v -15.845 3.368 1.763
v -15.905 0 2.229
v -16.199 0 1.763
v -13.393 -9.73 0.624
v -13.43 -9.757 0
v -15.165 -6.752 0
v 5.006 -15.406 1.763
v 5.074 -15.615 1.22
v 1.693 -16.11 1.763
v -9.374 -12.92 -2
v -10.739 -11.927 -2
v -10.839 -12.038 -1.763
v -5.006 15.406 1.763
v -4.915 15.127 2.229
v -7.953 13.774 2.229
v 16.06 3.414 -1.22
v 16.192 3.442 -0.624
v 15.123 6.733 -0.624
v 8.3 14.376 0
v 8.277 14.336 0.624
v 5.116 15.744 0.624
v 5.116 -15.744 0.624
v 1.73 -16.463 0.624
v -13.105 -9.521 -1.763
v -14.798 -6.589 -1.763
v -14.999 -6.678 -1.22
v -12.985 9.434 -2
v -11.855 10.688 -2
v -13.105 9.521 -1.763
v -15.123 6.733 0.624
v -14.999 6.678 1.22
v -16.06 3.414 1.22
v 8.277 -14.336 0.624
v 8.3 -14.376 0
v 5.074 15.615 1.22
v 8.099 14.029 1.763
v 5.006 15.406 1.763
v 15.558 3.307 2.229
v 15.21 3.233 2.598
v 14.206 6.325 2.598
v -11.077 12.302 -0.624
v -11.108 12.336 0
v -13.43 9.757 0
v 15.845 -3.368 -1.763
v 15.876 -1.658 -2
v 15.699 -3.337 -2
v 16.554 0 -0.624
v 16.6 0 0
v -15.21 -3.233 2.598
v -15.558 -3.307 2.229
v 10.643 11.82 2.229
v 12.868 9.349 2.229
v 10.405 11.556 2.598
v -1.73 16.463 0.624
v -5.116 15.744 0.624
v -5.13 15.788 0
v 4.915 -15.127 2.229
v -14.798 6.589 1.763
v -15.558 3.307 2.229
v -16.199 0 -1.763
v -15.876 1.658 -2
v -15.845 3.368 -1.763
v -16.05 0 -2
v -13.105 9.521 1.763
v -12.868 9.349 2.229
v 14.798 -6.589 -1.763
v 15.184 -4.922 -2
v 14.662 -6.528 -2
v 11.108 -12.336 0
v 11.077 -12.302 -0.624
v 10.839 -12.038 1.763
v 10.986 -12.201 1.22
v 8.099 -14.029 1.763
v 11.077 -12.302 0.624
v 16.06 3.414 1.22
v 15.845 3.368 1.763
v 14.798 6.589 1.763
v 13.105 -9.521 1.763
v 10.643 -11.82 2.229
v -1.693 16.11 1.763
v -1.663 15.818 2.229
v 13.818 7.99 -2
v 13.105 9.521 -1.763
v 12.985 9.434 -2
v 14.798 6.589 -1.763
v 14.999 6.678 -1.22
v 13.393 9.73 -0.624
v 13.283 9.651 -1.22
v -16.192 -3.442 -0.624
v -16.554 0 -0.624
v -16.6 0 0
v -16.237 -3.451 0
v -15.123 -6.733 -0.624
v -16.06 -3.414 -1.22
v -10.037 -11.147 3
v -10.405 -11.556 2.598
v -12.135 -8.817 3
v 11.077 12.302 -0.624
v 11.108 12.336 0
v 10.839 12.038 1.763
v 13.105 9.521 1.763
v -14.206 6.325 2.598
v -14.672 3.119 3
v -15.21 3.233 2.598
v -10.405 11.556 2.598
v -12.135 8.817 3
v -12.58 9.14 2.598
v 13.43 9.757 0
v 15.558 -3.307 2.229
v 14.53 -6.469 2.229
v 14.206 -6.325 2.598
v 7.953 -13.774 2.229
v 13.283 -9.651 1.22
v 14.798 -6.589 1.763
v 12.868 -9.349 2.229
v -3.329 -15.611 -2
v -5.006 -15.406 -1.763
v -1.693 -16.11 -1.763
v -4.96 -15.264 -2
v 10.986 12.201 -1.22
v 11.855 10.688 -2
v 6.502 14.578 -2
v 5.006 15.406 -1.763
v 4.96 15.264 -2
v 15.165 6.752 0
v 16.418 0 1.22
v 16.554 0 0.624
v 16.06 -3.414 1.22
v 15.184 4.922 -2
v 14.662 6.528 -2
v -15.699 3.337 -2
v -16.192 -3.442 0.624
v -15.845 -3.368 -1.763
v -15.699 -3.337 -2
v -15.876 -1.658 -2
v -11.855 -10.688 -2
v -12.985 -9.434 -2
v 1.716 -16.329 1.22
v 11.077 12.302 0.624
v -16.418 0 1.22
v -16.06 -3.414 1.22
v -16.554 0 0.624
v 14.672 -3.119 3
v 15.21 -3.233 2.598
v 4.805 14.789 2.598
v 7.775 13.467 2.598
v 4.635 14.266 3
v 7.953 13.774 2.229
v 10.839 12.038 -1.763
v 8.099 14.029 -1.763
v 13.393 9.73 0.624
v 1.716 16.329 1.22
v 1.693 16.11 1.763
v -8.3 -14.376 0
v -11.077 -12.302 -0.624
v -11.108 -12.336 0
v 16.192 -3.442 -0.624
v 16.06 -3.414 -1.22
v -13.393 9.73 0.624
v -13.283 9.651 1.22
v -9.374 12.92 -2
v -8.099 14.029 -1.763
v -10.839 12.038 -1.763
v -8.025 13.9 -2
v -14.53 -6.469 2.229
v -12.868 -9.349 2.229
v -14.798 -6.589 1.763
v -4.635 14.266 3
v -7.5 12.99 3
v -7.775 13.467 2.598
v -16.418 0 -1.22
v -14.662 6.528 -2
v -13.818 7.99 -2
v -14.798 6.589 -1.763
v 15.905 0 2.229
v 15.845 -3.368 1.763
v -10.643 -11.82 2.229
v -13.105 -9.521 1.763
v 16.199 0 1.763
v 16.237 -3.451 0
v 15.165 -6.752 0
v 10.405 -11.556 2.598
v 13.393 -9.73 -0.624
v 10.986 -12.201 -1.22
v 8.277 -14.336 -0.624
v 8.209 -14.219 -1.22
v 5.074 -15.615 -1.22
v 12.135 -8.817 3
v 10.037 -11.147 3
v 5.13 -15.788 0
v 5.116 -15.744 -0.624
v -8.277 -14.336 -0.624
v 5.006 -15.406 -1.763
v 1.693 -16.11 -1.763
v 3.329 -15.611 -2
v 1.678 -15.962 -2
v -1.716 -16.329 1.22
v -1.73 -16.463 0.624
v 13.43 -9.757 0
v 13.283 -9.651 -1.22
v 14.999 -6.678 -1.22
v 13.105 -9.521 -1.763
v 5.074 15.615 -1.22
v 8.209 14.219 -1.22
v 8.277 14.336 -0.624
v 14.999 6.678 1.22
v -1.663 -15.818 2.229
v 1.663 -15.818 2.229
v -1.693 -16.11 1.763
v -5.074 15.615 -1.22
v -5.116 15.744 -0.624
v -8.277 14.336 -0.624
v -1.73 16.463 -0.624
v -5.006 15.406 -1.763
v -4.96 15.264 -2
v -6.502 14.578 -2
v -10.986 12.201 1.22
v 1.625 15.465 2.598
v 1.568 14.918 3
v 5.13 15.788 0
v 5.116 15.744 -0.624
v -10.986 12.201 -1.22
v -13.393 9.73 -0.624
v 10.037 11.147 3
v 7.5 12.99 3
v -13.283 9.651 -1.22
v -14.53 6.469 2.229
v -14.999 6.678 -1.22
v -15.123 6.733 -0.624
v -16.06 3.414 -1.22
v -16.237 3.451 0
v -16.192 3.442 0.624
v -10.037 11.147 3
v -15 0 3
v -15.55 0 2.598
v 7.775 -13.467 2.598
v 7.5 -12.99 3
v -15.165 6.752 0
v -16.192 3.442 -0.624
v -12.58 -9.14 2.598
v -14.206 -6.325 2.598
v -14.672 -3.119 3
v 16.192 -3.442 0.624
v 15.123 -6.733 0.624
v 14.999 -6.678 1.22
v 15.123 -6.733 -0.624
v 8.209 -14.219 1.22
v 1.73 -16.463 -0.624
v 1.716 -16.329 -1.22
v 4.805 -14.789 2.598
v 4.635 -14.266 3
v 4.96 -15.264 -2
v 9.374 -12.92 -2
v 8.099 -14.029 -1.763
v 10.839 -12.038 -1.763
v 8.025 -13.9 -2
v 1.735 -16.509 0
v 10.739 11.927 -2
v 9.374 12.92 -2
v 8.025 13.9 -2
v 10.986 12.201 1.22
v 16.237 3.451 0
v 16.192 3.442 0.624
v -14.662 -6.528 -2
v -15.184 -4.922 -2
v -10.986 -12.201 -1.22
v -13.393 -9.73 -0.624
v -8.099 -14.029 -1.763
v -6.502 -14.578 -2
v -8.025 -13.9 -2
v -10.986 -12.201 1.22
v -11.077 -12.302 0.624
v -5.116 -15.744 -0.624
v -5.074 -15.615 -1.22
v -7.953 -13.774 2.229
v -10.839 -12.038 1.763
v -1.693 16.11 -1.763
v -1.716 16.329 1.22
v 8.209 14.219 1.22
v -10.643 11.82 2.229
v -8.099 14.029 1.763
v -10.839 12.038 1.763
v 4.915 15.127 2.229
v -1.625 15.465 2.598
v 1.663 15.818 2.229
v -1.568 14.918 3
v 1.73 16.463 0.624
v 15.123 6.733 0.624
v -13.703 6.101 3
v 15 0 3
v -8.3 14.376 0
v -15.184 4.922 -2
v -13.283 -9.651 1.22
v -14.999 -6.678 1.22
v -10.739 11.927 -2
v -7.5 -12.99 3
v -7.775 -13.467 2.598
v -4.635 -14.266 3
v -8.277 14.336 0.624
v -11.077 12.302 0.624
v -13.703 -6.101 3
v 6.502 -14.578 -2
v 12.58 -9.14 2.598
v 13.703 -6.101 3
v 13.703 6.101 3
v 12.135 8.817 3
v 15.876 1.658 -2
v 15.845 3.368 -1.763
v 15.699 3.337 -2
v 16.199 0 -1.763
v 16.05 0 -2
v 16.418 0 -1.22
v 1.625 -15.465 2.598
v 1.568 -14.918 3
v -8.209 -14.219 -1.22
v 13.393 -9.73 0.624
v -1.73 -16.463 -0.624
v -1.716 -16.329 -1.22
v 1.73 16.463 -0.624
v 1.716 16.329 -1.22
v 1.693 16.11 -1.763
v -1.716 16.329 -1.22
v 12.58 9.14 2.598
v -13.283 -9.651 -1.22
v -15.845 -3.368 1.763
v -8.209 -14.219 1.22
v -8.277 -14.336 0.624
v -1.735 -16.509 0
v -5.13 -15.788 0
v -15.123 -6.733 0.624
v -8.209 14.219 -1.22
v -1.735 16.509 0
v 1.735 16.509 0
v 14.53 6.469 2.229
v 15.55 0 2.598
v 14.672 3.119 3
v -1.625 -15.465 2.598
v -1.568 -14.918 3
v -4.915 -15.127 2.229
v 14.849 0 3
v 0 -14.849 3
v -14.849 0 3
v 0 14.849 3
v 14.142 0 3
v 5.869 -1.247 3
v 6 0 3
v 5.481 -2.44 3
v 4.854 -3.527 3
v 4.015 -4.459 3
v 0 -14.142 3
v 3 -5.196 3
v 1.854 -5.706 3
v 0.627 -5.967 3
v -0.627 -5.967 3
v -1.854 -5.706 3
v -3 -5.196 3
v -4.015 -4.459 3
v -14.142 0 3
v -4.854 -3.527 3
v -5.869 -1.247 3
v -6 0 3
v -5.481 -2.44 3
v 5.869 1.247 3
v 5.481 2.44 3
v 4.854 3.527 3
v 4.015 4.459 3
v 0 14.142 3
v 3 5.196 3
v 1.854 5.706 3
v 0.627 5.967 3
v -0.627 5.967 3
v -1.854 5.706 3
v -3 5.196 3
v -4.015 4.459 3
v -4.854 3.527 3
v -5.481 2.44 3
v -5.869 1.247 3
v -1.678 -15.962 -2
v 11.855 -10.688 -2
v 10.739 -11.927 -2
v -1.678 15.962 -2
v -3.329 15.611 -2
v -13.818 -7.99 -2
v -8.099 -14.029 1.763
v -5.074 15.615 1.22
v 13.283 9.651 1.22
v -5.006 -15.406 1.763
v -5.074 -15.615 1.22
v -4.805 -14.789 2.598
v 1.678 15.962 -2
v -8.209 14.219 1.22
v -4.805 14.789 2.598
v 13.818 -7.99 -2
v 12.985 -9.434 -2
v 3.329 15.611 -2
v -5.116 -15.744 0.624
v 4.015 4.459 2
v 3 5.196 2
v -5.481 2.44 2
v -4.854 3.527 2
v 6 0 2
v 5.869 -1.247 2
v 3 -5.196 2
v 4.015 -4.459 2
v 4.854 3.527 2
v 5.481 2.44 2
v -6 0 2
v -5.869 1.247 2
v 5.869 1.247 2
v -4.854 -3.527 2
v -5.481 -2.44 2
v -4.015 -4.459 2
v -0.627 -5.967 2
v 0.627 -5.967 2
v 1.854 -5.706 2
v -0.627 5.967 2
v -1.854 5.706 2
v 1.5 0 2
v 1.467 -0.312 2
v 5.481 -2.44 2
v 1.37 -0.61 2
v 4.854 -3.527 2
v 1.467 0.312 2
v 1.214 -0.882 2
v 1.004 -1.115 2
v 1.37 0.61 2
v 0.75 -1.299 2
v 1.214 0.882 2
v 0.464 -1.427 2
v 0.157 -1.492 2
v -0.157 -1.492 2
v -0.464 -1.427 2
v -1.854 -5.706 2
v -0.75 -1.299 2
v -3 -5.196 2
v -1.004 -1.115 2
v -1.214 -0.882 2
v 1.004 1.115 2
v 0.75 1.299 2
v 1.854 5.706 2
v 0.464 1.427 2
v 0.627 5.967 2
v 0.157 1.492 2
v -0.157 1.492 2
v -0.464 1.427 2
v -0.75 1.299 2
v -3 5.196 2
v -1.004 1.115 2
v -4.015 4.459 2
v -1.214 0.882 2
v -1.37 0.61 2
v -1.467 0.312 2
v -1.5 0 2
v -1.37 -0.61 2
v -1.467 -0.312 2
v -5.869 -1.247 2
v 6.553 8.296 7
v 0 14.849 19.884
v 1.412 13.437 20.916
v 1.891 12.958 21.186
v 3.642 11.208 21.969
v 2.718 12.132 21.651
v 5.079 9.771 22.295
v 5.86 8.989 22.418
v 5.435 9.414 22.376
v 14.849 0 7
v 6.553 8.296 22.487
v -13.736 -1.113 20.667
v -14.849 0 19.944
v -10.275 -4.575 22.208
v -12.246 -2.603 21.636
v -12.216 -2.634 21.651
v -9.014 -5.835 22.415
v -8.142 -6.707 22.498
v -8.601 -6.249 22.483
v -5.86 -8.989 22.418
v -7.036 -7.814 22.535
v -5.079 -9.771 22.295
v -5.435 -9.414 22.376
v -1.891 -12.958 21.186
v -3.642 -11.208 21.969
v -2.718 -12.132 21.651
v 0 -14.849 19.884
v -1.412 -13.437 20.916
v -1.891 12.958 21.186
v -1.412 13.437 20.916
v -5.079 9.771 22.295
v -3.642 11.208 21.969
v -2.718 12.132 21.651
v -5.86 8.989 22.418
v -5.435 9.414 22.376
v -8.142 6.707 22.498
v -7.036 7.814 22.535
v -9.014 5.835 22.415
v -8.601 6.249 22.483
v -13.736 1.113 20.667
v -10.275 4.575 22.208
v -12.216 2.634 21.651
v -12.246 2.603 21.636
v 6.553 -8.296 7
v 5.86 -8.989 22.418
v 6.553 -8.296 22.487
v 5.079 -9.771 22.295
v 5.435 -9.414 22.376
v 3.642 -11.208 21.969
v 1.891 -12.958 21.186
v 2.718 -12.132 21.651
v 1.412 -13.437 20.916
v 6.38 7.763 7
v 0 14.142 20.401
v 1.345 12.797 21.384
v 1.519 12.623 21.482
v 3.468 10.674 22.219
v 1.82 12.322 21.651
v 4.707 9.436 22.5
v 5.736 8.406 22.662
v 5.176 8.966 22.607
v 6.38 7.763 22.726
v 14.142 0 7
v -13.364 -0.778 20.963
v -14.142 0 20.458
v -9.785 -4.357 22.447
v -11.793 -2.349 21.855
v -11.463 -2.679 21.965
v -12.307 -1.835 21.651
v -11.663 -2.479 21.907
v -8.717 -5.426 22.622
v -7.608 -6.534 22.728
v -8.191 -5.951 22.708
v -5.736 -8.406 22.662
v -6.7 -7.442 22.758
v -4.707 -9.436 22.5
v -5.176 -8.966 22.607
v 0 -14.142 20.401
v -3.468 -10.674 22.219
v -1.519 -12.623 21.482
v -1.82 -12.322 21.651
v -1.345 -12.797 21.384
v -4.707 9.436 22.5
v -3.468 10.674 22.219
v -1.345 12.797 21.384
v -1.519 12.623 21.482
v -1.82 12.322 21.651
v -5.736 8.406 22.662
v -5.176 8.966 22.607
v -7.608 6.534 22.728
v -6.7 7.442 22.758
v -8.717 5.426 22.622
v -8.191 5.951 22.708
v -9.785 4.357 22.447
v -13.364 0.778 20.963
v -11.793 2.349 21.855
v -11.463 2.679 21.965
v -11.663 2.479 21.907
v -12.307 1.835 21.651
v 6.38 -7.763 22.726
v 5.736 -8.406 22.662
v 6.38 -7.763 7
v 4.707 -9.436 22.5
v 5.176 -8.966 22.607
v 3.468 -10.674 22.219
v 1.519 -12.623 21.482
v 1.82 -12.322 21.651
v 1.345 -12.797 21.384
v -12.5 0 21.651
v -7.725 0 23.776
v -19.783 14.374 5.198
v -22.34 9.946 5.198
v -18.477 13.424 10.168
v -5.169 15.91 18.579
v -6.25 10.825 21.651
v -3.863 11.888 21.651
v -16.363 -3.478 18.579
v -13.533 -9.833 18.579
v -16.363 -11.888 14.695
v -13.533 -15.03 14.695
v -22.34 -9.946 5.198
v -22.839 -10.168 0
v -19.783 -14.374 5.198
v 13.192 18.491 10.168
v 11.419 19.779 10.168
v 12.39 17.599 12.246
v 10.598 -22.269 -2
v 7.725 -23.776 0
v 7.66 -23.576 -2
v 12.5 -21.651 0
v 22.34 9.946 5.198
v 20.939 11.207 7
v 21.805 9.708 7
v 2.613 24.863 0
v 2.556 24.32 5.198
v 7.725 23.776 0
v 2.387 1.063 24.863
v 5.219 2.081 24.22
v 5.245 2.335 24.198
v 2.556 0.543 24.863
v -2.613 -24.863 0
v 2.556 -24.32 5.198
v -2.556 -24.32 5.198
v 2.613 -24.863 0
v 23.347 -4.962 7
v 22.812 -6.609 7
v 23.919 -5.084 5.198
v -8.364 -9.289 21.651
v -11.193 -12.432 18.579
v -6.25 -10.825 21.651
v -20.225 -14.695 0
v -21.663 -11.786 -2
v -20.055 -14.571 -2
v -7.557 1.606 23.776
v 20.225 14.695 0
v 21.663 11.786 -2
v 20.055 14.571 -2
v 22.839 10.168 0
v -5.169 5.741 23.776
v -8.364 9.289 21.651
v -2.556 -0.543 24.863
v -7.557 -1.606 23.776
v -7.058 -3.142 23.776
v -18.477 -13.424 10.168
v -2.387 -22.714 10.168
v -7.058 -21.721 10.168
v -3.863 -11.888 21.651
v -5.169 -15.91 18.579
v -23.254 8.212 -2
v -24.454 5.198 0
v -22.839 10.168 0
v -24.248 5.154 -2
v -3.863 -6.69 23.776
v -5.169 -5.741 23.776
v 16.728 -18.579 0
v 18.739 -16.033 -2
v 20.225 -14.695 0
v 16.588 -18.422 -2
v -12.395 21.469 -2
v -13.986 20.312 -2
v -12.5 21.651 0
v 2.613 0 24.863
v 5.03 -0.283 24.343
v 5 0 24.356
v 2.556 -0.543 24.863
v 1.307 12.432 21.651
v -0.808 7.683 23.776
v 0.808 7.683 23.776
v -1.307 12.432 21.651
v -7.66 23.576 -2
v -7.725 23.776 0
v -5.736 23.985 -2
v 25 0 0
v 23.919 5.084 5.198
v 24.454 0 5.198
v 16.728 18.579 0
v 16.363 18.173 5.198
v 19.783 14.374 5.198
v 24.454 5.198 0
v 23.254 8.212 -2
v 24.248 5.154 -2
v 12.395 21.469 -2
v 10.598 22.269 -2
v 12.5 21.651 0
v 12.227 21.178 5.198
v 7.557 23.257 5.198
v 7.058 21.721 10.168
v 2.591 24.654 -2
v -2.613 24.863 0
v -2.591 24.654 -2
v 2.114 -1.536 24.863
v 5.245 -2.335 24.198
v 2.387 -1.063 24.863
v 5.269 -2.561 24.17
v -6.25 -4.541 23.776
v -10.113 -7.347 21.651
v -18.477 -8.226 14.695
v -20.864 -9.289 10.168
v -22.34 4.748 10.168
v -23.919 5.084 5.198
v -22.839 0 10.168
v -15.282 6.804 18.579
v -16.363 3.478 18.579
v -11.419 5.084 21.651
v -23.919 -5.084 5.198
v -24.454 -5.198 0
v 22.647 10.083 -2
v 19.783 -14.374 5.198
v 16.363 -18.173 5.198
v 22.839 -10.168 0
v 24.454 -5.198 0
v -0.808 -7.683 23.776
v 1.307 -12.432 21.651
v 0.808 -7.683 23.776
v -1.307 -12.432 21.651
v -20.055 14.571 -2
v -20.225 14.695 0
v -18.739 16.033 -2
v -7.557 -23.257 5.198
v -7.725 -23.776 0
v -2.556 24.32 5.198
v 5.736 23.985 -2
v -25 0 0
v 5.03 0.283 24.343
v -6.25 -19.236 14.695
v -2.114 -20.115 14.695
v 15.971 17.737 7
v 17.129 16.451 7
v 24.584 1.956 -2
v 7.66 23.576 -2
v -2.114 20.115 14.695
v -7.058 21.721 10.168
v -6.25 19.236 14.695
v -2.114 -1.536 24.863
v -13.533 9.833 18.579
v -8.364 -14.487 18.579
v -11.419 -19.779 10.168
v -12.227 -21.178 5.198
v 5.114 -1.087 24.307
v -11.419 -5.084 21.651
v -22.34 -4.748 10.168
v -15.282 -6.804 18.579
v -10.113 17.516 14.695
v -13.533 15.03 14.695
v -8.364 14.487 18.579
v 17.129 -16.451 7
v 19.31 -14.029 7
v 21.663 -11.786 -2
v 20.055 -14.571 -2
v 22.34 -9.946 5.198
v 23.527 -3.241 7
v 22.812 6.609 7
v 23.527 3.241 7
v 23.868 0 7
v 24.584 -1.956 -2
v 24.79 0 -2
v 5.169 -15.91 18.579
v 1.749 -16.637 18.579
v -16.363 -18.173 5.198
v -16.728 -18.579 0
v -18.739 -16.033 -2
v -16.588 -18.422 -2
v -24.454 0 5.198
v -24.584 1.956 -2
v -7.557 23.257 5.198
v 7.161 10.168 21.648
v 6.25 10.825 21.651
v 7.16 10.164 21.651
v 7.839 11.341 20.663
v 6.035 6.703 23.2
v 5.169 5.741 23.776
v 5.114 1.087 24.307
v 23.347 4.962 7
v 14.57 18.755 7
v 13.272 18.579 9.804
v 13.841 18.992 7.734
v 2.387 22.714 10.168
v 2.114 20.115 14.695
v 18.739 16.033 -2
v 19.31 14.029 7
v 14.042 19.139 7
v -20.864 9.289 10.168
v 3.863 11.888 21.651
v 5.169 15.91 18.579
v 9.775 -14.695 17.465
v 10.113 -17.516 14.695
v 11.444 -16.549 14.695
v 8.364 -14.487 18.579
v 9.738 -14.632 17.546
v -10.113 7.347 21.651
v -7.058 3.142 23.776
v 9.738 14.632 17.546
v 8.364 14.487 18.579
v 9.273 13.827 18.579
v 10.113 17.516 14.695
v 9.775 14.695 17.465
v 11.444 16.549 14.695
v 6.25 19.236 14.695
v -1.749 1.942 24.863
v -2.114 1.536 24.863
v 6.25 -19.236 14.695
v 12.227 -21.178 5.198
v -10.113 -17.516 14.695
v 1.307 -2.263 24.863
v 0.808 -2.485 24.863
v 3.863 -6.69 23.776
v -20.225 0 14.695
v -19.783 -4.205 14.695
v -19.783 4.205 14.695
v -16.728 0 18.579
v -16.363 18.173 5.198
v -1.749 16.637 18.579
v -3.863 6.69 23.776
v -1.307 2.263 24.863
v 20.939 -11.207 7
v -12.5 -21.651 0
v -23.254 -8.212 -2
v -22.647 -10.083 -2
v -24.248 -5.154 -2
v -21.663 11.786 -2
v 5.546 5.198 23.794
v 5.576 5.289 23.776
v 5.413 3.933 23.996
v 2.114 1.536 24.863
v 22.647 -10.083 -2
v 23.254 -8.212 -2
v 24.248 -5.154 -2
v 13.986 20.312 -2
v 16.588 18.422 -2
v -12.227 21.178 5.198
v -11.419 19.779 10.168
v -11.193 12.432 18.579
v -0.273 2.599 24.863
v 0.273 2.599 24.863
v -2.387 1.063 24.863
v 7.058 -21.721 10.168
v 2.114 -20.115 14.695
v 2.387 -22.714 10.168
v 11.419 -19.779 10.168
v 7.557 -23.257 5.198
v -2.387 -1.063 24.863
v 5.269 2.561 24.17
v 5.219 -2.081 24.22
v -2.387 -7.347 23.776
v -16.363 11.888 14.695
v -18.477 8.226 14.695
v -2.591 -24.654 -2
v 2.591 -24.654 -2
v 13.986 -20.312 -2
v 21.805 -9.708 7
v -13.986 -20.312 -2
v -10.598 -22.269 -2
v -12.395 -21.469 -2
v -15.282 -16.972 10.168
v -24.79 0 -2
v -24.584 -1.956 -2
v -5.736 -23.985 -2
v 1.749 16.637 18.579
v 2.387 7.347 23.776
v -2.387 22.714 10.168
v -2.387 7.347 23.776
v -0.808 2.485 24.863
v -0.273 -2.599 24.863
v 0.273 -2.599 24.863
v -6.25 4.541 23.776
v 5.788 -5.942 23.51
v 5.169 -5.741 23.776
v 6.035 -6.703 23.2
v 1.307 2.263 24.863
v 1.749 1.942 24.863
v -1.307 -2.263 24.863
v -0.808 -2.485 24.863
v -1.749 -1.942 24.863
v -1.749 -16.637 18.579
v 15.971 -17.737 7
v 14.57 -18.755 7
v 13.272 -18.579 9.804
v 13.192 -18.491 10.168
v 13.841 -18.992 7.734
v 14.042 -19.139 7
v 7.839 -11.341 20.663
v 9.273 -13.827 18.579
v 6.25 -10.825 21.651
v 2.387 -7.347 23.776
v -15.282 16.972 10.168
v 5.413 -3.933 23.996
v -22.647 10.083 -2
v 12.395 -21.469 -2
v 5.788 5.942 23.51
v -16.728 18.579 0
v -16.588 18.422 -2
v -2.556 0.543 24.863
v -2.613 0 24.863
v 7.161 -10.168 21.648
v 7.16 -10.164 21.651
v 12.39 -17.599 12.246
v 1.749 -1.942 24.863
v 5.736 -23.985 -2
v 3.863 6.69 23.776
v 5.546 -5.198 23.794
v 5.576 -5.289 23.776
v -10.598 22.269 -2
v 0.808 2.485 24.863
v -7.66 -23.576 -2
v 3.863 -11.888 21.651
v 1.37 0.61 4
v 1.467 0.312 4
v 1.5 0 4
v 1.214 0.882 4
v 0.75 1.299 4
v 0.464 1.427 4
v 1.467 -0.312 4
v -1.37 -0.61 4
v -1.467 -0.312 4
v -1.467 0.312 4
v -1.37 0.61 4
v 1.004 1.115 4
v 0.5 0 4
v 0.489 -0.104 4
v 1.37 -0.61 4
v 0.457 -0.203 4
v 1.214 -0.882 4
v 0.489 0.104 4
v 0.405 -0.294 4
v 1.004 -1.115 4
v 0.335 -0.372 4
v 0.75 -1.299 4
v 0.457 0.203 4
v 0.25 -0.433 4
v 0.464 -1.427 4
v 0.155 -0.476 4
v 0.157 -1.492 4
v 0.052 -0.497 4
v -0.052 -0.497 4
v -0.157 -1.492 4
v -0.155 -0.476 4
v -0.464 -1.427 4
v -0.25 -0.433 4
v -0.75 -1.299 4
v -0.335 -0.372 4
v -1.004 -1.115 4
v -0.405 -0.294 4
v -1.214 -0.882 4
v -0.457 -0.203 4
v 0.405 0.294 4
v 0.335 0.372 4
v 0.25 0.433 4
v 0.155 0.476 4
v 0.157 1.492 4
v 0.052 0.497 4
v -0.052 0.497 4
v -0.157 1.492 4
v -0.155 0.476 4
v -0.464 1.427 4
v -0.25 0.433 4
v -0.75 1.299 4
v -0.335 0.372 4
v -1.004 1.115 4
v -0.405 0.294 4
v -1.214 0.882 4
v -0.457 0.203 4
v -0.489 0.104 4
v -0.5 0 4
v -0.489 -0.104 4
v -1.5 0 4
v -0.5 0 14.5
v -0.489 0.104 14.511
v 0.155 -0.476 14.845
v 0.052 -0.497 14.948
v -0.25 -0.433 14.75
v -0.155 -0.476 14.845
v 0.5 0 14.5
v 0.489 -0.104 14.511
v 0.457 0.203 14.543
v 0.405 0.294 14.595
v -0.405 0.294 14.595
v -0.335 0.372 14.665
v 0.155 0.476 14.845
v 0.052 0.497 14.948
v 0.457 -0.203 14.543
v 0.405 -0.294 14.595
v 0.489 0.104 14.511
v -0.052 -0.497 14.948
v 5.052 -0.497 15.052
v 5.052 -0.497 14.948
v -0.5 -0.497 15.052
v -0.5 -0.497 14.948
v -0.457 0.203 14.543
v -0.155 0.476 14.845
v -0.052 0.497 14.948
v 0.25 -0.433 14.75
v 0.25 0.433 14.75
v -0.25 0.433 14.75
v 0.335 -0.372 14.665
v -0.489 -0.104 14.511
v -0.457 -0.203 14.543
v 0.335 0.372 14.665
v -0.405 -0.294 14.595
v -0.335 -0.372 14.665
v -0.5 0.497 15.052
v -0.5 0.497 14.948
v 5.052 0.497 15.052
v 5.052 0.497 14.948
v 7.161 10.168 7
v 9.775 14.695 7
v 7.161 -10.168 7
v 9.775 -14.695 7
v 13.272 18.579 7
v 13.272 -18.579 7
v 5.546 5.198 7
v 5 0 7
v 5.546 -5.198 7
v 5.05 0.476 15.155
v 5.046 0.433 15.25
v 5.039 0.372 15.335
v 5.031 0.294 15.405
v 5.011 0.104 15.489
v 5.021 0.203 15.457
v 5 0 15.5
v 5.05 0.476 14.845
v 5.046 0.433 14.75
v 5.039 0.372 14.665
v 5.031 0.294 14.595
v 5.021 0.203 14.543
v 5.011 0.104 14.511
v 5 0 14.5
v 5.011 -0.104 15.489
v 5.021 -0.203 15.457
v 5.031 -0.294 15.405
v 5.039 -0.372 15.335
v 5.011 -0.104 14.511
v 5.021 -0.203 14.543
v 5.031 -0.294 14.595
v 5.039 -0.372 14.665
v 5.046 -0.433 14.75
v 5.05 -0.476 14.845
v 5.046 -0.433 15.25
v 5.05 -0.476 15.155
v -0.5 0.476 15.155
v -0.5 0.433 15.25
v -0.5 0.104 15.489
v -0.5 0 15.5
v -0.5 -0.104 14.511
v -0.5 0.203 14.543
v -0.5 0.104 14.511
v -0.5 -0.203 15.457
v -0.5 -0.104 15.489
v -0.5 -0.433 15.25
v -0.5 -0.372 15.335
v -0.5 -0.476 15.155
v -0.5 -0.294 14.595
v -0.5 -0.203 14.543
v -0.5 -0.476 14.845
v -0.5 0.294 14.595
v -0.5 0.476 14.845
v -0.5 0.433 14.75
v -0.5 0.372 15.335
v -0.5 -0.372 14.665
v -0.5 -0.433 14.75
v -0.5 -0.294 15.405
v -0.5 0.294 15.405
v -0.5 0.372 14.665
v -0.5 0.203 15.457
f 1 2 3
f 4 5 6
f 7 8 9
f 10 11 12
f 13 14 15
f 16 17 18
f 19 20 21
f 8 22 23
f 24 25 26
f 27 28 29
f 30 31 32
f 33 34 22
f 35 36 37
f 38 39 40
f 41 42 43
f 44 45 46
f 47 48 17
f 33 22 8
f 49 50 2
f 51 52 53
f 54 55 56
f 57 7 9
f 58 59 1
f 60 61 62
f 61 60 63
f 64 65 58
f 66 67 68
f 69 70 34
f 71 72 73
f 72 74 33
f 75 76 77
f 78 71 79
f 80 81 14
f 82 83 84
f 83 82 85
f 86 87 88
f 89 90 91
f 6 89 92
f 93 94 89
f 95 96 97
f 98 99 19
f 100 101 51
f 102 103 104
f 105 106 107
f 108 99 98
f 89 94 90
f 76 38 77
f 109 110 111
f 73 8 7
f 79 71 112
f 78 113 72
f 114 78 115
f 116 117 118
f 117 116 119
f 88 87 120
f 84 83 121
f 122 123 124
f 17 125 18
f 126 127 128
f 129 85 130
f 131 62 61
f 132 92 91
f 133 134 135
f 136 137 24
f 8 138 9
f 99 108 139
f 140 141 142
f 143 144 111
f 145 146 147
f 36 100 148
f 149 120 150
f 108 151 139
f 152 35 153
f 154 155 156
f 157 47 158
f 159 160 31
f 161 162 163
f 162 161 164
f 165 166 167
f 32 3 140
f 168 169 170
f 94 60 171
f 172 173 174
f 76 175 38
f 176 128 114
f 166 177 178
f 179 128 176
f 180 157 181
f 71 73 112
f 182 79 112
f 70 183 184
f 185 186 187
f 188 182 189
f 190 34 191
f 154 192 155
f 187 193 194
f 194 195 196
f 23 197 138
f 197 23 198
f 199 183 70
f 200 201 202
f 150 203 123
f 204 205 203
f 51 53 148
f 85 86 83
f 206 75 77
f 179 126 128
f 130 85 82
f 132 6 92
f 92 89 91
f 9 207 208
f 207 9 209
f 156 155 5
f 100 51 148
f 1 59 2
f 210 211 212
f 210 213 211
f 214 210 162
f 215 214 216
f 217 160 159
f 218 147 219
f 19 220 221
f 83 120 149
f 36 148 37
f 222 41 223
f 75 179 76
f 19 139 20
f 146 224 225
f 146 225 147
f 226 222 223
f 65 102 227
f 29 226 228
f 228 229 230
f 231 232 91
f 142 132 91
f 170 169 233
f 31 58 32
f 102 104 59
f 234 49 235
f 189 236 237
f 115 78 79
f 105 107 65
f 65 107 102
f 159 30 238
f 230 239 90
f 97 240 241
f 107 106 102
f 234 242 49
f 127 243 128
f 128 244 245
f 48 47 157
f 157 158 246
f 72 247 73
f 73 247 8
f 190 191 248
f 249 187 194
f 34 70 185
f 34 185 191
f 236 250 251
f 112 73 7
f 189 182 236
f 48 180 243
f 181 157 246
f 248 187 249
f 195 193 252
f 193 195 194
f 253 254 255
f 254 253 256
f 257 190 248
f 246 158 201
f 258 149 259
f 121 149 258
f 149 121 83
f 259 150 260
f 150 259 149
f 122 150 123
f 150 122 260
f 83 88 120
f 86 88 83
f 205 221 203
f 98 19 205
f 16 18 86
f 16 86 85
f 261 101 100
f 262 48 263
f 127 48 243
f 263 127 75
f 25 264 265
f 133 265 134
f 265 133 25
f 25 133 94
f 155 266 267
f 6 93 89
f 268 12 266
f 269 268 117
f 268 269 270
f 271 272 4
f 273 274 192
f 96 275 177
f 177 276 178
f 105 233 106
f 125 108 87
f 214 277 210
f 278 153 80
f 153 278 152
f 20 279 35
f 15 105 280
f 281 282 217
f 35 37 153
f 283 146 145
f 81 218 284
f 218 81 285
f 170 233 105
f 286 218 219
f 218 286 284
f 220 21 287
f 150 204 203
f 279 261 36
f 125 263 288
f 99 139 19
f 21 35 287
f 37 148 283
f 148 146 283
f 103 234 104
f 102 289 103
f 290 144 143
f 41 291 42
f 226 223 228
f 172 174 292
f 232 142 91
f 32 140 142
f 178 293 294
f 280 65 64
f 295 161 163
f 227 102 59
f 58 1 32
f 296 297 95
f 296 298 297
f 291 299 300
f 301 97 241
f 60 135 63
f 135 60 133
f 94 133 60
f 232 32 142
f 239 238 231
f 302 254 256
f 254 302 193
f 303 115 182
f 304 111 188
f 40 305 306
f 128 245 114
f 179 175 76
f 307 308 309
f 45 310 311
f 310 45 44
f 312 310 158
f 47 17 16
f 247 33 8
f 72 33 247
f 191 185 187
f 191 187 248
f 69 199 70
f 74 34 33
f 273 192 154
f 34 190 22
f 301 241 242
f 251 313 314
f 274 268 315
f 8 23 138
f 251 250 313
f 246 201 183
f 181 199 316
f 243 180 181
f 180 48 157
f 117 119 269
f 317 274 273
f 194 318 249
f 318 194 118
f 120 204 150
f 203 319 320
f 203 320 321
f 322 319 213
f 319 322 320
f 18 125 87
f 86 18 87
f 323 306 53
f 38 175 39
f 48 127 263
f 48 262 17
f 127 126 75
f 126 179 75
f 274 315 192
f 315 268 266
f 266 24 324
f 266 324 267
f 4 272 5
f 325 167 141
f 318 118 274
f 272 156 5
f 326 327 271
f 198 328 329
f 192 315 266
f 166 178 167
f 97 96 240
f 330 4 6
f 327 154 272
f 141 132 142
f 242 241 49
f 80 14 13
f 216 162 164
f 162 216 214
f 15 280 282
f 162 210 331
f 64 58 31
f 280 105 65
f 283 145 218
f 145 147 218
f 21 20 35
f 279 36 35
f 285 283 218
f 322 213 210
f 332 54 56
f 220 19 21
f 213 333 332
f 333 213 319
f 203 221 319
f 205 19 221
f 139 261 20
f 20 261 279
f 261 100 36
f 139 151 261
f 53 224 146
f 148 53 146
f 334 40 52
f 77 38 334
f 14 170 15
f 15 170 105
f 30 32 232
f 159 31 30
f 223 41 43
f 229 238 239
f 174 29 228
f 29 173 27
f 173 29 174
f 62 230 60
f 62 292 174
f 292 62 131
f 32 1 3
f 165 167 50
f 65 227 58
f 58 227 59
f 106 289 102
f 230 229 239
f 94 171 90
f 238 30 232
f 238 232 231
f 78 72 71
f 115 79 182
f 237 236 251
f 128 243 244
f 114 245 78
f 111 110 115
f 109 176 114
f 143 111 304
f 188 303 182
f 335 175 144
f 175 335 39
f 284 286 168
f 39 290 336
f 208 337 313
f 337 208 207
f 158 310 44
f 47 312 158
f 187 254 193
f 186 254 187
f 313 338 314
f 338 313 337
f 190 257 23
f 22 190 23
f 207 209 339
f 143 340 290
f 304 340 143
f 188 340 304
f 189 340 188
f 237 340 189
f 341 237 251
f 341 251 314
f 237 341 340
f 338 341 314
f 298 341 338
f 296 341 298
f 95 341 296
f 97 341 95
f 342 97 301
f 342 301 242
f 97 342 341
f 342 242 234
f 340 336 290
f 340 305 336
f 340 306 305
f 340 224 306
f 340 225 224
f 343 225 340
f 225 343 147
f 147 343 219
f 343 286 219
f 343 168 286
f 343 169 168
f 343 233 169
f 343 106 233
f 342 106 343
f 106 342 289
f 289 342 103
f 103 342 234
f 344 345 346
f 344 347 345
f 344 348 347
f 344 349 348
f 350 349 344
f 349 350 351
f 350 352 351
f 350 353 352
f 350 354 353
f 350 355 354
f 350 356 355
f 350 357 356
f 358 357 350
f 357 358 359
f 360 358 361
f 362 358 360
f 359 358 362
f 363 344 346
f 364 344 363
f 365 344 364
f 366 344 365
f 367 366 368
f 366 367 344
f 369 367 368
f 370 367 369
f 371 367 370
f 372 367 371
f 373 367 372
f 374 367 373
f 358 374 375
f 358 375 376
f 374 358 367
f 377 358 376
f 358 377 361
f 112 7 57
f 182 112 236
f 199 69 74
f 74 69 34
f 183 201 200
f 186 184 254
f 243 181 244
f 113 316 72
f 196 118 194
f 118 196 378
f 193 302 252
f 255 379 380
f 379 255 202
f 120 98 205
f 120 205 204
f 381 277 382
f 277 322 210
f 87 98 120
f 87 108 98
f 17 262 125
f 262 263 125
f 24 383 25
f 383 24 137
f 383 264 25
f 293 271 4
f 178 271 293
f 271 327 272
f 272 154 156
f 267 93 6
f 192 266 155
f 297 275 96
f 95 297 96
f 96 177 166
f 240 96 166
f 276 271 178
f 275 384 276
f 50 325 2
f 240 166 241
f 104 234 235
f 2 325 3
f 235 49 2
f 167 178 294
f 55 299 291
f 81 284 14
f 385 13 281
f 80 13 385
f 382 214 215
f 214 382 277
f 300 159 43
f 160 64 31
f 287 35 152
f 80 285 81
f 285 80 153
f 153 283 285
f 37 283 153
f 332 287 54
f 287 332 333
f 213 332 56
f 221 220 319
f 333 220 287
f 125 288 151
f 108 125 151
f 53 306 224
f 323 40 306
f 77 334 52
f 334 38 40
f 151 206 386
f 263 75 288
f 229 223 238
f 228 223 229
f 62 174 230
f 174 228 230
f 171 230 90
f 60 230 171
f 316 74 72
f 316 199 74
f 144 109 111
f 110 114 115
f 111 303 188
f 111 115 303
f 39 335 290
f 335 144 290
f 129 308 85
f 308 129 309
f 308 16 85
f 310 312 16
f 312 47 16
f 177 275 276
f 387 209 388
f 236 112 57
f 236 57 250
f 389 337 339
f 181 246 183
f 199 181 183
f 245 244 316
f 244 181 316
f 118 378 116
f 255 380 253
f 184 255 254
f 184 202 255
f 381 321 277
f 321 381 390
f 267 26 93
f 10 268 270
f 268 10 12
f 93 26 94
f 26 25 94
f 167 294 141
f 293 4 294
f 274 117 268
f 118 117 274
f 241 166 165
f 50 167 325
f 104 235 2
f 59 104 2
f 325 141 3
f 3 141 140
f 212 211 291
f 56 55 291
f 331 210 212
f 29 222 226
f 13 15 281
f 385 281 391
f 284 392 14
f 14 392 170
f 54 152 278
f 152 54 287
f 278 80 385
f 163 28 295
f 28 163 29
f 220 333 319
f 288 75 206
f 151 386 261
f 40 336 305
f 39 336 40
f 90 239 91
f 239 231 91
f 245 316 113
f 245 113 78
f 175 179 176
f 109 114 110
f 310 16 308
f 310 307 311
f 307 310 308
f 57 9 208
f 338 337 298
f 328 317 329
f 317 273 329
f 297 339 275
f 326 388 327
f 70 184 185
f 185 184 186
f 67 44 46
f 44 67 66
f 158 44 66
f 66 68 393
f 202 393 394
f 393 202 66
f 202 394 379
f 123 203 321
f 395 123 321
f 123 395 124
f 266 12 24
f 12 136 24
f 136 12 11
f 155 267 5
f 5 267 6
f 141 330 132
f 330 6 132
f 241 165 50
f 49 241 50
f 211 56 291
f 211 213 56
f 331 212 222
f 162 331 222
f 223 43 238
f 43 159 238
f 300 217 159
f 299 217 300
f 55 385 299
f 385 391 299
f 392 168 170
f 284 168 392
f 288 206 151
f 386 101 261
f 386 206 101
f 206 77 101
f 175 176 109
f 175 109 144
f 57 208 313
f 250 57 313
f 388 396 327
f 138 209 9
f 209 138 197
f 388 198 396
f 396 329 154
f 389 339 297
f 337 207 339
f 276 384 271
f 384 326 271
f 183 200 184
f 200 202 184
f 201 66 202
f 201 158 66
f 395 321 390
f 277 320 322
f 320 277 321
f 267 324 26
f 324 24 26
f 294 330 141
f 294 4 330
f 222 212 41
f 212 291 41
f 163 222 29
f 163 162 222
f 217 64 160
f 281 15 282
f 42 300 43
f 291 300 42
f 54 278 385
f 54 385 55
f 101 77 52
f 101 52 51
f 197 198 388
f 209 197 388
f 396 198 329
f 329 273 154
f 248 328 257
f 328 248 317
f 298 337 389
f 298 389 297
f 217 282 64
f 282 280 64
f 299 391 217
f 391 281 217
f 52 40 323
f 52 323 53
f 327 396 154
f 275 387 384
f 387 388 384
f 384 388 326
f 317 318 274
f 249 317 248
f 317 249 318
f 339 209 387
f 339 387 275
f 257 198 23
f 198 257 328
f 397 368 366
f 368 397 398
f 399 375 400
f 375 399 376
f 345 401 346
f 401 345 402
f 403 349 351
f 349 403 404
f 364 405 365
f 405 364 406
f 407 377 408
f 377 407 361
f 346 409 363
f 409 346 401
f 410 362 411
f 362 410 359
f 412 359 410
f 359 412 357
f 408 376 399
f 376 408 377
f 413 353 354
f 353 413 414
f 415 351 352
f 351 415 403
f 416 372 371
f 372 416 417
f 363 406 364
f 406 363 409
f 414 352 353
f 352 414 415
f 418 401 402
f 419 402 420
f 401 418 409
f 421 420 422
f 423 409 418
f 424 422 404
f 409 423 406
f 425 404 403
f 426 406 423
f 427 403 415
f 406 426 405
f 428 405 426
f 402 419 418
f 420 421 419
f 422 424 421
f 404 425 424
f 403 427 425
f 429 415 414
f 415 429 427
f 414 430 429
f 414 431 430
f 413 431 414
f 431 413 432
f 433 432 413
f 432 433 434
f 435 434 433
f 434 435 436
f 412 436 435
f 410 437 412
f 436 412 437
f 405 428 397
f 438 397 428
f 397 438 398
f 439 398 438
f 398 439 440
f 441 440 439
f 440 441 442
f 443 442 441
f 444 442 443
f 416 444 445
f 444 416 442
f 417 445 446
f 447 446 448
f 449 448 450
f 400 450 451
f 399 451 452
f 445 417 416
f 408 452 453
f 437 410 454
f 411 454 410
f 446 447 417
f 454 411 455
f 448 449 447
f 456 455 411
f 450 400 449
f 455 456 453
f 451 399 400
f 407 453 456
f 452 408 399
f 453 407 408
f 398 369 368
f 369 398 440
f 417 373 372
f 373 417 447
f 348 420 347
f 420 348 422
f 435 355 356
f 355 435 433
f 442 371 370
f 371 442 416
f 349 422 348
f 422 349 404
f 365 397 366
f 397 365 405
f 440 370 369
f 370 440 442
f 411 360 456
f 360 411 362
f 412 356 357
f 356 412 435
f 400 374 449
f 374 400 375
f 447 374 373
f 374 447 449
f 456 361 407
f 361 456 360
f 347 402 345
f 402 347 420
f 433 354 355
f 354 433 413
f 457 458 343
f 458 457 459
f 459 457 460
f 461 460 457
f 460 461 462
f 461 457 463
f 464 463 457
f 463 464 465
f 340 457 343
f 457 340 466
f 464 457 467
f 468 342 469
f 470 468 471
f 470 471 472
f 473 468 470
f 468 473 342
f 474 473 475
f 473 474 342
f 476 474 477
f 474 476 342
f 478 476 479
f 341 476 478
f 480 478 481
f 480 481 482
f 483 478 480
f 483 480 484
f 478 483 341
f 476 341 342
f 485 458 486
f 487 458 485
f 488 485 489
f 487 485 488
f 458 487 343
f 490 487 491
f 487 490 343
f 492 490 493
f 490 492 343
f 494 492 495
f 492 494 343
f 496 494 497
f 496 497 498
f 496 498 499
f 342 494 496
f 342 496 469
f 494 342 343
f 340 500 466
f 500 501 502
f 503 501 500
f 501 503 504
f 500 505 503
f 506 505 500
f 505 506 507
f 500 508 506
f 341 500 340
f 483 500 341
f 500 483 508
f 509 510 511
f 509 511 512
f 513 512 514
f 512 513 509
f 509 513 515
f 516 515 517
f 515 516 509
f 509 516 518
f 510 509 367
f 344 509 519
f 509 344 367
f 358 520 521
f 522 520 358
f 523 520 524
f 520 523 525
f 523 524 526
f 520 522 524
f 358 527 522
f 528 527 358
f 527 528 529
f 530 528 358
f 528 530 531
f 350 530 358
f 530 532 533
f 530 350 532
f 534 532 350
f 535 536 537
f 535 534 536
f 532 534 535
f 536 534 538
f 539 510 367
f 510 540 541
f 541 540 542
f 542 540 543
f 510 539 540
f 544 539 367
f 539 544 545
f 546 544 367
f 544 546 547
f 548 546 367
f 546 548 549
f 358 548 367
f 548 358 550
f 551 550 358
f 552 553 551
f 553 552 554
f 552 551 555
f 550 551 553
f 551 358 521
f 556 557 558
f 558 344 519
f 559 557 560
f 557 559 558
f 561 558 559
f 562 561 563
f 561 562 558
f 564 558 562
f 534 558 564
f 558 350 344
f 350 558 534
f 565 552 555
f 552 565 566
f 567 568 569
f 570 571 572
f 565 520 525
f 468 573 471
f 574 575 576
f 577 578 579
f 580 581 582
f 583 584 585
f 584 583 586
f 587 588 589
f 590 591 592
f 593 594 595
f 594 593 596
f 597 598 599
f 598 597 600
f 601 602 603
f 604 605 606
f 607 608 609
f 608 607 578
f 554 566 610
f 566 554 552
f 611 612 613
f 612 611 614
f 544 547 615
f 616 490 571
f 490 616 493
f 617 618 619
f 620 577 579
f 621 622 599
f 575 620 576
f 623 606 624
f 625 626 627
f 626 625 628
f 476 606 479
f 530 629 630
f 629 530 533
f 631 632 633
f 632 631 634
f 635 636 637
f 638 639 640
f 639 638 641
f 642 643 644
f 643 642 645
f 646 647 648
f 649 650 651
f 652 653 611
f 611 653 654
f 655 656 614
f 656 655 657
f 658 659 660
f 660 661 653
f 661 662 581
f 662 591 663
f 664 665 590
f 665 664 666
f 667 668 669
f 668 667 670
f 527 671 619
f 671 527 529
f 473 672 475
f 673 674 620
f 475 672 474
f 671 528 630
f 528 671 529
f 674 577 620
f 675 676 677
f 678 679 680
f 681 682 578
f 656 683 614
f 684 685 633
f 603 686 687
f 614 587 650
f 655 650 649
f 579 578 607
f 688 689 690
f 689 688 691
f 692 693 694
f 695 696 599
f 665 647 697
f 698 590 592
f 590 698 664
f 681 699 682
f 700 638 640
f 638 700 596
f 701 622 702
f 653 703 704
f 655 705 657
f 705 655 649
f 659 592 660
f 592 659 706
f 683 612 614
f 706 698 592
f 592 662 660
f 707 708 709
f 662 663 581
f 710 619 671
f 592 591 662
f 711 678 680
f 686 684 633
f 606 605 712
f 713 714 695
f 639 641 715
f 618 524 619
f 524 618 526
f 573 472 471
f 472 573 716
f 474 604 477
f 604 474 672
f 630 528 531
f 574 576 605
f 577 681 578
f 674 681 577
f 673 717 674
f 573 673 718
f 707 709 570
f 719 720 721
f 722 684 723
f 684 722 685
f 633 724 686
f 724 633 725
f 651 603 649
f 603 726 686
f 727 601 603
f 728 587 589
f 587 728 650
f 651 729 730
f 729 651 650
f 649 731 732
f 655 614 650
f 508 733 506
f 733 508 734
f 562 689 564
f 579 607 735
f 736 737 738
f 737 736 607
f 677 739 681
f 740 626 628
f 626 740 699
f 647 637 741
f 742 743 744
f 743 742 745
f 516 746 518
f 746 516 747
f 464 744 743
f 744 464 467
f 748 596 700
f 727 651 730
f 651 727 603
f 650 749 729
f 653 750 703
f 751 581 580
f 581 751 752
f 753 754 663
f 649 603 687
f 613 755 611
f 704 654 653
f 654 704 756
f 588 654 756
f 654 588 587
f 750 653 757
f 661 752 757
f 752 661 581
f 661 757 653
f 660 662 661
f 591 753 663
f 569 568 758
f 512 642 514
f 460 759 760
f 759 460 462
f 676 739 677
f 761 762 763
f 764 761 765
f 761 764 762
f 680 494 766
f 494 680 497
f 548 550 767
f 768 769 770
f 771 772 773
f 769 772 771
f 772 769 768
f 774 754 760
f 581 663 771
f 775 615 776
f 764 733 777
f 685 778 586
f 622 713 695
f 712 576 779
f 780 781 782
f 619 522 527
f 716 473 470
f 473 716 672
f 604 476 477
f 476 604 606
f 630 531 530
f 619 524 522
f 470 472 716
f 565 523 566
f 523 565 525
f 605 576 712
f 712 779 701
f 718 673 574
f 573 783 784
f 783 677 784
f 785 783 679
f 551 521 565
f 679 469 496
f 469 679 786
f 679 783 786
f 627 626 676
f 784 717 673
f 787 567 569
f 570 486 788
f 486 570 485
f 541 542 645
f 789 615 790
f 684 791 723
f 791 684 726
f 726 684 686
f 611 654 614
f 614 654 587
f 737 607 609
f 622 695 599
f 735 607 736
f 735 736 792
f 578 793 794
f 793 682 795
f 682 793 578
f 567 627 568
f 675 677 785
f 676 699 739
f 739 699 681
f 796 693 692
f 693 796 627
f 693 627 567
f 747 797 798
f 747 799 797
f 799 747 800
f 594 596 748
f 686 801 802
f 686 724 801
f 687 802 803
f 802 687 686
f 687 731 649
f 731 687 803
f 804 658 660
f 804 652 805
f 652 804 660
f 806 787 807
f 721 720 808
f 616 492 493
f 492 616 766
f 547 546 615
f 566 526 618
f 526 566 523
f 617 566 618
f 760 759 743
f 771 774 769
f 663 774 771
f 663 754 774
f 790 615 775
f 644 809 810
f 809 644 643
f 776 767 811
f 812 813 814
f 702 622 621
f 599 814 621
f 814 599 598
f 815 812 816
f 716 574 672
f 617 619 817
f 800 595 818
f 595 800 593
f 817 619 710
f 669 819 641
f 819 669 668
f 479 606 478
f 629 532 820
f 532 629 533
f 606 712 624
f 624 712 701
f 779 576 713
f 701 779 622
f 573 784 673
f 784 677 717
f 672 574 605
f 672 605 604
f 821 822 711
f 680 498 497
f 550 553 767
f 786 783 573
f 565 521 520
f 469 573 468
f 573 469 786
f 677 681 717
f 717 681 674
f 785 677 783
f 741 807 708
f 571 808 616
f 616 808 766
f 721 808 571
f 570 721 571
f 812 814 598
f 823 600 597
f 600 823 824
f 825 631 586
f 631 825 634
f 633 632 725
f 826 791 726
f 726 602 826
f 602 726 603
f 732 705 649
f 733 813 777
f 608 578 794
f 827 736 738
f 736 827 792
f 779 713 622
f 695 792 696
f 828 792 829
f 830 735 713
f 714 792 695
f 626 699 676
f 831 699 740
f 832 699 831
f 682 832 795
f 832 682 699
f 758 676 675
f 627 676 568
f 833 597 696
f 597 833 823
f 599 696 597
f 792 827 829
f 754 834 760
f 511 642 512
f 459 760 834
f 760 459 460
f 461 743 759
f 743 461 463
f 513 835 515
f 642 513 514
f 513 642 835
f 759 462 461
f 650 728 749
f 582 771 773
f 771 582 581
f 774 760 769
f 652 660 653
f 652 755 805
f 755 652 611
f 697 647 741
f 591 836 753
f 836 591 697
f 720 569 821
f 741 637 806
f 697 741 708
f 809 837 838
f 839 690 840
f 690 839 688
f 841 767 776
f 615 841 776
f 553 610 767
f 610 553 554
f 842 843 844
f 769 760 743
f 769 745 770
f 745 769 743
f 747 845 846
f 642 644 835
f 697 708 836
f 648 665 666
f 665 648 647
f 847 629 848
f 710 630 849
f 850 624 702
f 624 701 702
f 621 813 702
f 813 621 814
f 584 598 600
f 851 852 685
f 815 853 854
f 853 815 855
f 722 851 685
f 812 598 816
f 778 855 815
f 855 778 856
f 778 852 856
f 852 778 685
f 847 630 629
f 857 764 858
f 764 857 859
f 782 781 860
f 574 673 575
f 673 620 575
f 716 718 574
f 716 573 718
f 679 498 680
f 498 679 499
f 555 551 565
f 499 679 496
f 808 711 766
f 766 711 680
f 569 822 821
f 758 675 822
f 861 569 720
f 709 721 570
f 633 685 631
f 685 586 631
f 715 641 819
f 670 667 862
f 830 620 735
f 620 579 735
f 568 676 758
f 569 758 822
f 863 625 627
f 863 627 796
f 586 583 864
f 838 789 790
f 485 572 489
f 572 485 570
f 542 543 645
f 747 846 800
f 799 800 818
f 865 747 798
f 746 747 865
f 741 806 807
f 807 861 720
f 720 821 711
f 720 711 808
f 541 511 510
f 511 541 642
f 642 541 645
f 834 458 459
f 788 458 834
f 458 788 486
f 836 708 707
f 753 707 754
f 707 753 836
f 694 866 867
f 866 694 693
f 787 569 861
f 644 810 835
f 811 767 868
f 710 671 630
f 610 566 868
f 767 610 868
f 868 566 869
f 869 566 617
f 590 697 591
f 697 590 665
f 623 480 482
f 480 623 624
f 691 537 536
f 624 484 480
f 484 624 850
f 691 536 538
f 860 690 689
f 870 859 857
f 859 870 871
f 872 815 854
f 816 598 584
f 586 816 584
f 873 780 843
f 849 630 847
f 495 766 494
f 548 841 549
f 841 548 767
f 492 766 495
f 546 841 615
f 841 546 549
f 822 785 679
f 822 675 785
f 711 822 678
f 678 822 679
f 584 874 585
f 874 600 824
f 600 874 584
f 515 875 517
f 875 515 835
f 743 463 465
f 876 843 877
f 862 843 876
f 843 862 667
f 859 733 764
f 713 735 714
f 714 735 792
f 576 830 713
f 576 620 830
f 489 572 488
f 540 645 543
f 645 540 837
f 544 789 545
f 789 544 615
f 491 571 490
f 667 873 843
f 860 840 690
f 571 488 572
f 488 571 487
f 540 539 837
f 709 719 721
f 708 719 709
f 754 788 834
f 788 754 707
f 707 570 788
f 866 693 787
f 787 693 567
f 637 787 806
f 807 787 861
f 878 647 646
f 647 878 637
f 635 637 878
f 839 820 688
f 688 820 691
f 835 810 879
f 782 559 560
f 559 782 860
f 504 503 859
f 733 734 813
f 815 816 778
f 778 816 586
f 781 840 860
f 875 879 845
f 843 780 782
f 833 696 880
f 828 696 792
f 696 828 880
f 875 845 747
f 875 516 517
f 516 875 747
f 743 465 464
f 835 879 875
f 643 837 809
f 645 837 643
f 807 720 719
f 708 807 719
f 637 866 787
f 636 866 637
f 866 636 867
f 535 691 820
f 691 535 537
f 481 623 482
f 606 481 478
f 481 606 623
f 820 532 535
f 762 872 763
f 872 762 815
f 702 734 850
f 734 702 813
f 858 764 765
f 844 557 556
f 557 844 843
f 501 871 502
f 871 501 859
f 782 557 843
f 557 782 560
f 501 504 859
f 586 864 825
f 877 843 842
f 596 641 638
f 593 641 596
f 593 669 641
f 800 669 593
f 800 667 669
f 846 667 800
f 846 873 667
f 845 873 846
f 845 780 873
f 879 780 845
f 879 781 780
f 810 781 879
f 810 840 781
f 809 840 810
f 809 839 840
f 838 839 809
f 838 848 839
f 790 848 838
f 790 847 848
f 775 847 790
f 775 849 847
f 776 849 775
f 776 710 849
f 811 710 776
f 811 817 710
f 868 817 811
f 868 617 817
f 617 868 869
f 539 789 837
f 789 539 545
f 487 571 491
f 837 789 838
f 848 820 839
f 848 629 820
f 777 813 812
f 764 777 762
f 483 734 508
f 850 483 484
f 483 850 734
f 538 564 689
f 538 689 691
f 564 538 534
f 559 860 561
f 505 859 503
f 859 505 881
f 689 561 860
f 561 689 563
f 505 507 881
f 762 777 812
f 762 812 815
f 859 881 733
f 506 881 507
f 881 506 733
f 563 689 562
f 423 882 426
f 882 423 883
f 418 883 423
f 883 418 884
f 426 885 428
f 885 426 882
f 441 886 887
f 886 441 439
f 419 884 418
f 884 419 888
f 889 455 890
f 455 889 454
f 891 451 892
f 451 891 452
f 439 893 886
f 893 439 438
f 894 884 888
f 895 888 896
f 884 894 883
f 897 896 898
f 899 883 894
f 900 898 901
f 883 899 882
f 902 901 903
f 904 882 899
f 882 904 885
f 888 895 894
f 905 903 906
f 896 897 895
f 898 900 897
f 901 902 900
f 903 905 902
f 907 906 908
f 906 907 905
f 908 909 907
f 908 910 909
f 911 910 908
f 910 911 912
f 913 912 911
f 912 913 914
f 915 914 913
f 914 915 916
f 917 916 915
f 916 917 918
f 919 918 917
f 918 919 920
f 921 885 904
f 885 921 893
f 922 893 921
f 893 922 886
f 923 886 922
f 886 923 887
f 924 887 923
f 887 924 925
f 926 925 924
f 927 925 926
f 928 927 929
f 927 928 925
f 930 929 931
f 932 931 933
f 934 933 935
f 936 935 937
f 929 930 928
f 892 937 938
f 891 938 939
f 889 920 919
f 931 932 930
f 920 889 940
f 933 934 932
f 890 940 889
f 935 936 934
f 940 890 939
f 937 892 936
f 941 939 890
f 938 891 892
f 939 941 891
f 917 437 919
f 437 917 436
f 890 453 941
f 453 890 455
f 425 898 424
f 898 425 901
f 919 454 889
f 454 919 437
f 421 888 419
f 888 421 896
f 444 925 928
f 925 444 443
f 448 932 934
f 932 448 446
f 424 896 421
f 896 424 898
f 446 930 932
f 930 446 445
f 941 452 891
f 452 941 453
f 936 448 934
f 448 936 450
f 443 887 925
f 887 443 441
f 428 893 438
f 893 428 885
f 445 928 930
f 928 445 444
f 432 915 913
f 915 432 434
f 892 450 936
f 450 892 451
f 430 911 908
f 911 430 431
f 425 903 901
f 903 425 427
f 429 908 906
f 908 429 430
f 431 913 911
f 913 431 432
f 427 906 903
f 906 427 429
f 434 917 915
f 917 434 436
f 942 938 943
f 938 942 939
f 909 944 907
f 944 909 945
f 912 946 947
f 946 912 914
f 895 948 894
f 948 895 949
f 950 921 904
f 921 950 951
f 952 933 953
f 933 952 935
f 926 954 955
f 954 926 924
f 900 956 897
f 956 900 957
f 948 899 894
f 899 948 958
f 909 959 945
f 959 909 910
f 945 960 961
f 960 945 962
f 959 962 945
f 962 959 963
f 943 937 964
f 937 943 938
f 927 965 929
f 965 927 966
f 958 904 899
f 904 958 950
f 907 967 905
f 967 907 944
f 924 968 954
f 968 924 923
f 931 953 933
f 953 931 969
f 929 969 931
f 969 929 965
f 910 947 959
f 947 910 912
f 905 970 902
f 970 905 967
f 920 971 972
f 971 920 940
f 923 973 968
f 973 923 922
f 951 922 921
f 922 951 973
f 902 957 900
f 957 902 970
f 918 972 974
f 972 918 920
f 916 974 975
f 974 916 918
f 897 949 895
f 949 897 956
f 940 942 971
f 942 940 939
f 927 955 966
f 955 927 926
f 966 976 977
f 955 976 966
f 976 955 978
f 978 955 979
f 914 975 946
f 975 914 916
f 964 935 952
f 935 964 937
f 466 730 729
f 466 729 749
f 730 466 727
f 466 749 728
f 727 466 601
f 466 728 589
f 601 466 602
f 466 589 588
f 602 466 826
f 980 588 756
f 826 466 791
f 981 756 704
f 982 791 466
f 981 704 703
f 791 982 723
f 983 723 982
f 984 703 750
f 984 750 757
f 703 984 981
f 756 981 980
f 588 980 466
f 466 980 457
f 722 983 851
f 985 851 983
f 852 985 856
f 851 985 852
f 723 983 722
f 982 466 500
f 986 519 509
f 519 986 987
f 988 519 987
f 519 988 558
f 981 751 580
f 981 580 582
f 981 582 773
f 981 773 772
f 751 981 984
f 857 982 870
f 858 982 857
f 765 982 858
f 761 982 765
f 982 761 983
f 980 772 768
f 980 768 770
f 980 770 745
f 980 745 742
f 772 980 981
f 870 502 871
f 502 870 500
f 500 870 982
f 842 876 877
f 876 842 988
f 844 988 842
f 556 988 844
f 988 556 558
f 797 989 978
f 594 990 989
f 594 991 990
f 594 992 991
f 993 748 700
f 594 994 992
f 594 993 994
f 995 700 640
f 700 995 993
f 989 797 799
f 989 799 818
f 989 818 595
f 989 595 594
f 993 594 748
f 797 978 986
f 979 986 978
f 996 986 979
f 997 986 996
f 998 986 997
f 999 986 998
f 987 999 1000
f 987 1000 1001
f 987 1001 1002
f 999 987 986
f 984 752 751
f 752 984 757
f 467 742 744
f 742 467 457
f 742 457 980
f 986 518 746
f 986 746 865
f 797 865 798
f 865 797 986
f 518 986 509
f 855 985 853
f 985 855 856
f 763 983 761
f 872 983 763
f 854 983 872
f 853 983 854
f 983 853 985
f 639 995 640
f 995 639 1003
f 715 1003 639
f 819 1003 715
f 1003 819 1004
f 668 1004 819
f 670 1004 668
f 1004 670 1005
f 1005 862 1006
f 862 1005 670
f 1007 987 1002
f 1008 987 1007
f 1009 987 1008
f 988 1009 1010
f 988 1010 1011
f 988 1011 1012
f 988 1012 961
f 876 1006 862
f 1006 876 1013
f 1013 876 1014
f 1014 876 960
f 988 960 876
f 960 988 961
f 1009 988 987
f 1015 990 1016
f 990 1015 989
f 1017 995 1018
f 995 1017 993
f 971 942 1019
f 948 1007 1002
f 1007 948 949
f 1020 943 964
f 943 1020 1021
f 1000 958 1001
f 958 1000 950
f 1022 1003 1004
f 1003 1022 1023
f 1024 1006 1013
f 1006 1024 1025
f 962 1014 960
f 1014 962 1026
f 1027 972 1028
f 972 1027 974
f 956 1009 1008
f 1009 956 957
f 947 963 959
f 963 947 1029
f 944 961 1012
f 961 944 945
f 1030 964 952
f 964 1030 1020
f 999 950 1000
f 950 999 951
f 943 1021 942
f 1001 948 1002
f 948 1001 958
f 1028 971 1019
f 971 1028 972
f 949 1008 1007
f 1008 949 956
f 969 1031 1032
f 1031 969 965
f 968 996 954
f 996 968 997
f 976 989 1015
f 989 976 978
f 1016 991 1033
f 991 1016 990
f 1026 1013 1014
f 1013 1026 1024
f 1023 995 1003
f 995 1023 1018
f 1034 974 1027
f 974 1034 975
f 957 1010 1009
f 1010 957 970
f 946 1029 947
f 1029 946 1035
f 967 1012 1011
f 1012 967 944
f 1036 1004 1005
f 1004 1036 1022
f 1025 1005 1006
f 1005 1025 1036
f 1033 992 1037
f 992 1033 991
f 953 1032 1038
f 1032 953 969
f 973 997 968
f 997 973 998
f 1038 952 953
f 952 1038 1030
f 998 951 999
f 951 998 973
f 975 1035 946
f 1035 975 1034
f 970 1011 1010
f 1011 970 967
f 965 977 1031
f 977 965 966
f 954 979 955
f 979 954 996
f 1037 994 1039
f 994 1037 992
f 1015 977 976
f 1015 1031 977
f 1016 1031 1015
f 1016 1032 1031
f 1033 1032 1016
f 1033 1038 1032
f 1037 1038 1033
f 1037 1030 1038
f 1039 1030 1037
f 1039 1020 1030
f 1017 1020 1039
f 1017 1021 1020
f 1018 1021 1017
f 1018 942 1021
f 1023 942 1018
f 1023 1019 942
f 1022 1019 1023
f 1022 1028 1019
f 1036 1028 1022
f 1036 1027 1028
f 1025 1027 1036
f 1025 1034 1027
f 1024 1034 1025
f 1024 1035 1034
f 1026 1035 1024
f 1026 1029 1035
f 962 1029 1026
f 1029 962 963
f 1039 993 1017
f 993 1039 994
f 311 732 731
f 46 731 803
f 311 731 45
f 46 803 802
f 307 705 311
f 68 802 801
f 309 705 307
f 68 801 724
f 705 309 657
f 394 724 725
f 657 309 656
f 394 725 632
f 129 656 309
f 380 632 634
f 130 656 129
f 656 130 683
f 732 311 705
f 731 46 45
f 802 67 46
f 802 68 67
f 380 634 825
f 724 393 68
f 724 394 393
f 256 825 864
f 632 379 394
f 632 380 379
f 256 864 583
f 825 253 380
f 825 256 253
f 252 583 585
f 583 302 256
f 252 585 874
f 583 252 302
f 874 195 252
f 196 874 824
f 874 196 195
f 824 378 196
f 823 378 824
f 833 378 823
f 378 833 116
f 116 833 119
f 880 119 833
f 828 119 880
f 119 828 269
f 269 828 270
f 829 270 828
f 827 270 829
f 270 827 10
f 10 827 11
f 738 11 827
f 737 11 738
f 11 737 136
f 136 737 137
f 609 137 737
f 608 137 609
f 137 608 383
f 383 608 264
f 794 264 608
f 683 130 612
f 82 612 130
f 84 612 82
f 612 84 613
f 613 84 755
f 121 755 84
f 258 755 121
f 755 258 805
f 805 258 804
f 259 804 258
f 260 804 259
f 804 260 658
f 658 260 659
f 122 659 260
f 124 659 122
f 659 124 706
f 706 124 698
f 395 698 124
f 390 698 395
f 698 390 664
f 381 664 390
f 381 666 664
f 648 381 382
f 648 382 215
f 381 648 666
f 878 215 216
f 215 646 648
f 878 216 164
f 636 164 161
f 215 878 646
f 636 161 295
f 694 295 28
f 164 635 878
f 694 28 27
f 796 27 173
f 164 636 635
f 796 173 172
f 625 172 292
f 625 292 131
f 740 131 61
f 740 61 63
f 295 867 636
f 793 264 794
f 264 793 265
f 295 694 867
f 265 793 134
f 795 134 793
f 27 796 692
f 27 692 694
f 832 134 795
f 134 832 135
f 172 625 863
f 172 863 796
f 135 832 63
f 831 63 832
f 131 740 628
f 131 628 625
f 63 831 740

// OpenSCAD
$fn=30;

difference(){
    sphere(r=25);
    difference(){
        hull(){
            cylinder(r=15,h=6,center=true);
            rotate_extrude(angle=360) 
                translate([14.5,0]) 
                scale([3.5/5,1,1]) 
                circle(r=3);
        }
        translate([0,0,2]) cylinder(r=6,h=10);
    }
    cylinder(r=1.5,h=8,center=true);
    cylinder(r=0.5,h=15);
    translate([30,0,7]) cylinder(r=25,h=30);
    rotate([0,0,45]) difference(){
        cube([21,21,102],center=true);
        cube([20,20,100],center=true);
        }
    translate([-0.5,0,15]) rotate([0,90,0]) cylinder(r=0.5,h=6);

    translate([0,0,-52]) cube([100,100,100],center=true);
    //translate([0,-50,0]) cube([100,100,100],center=true);

}
